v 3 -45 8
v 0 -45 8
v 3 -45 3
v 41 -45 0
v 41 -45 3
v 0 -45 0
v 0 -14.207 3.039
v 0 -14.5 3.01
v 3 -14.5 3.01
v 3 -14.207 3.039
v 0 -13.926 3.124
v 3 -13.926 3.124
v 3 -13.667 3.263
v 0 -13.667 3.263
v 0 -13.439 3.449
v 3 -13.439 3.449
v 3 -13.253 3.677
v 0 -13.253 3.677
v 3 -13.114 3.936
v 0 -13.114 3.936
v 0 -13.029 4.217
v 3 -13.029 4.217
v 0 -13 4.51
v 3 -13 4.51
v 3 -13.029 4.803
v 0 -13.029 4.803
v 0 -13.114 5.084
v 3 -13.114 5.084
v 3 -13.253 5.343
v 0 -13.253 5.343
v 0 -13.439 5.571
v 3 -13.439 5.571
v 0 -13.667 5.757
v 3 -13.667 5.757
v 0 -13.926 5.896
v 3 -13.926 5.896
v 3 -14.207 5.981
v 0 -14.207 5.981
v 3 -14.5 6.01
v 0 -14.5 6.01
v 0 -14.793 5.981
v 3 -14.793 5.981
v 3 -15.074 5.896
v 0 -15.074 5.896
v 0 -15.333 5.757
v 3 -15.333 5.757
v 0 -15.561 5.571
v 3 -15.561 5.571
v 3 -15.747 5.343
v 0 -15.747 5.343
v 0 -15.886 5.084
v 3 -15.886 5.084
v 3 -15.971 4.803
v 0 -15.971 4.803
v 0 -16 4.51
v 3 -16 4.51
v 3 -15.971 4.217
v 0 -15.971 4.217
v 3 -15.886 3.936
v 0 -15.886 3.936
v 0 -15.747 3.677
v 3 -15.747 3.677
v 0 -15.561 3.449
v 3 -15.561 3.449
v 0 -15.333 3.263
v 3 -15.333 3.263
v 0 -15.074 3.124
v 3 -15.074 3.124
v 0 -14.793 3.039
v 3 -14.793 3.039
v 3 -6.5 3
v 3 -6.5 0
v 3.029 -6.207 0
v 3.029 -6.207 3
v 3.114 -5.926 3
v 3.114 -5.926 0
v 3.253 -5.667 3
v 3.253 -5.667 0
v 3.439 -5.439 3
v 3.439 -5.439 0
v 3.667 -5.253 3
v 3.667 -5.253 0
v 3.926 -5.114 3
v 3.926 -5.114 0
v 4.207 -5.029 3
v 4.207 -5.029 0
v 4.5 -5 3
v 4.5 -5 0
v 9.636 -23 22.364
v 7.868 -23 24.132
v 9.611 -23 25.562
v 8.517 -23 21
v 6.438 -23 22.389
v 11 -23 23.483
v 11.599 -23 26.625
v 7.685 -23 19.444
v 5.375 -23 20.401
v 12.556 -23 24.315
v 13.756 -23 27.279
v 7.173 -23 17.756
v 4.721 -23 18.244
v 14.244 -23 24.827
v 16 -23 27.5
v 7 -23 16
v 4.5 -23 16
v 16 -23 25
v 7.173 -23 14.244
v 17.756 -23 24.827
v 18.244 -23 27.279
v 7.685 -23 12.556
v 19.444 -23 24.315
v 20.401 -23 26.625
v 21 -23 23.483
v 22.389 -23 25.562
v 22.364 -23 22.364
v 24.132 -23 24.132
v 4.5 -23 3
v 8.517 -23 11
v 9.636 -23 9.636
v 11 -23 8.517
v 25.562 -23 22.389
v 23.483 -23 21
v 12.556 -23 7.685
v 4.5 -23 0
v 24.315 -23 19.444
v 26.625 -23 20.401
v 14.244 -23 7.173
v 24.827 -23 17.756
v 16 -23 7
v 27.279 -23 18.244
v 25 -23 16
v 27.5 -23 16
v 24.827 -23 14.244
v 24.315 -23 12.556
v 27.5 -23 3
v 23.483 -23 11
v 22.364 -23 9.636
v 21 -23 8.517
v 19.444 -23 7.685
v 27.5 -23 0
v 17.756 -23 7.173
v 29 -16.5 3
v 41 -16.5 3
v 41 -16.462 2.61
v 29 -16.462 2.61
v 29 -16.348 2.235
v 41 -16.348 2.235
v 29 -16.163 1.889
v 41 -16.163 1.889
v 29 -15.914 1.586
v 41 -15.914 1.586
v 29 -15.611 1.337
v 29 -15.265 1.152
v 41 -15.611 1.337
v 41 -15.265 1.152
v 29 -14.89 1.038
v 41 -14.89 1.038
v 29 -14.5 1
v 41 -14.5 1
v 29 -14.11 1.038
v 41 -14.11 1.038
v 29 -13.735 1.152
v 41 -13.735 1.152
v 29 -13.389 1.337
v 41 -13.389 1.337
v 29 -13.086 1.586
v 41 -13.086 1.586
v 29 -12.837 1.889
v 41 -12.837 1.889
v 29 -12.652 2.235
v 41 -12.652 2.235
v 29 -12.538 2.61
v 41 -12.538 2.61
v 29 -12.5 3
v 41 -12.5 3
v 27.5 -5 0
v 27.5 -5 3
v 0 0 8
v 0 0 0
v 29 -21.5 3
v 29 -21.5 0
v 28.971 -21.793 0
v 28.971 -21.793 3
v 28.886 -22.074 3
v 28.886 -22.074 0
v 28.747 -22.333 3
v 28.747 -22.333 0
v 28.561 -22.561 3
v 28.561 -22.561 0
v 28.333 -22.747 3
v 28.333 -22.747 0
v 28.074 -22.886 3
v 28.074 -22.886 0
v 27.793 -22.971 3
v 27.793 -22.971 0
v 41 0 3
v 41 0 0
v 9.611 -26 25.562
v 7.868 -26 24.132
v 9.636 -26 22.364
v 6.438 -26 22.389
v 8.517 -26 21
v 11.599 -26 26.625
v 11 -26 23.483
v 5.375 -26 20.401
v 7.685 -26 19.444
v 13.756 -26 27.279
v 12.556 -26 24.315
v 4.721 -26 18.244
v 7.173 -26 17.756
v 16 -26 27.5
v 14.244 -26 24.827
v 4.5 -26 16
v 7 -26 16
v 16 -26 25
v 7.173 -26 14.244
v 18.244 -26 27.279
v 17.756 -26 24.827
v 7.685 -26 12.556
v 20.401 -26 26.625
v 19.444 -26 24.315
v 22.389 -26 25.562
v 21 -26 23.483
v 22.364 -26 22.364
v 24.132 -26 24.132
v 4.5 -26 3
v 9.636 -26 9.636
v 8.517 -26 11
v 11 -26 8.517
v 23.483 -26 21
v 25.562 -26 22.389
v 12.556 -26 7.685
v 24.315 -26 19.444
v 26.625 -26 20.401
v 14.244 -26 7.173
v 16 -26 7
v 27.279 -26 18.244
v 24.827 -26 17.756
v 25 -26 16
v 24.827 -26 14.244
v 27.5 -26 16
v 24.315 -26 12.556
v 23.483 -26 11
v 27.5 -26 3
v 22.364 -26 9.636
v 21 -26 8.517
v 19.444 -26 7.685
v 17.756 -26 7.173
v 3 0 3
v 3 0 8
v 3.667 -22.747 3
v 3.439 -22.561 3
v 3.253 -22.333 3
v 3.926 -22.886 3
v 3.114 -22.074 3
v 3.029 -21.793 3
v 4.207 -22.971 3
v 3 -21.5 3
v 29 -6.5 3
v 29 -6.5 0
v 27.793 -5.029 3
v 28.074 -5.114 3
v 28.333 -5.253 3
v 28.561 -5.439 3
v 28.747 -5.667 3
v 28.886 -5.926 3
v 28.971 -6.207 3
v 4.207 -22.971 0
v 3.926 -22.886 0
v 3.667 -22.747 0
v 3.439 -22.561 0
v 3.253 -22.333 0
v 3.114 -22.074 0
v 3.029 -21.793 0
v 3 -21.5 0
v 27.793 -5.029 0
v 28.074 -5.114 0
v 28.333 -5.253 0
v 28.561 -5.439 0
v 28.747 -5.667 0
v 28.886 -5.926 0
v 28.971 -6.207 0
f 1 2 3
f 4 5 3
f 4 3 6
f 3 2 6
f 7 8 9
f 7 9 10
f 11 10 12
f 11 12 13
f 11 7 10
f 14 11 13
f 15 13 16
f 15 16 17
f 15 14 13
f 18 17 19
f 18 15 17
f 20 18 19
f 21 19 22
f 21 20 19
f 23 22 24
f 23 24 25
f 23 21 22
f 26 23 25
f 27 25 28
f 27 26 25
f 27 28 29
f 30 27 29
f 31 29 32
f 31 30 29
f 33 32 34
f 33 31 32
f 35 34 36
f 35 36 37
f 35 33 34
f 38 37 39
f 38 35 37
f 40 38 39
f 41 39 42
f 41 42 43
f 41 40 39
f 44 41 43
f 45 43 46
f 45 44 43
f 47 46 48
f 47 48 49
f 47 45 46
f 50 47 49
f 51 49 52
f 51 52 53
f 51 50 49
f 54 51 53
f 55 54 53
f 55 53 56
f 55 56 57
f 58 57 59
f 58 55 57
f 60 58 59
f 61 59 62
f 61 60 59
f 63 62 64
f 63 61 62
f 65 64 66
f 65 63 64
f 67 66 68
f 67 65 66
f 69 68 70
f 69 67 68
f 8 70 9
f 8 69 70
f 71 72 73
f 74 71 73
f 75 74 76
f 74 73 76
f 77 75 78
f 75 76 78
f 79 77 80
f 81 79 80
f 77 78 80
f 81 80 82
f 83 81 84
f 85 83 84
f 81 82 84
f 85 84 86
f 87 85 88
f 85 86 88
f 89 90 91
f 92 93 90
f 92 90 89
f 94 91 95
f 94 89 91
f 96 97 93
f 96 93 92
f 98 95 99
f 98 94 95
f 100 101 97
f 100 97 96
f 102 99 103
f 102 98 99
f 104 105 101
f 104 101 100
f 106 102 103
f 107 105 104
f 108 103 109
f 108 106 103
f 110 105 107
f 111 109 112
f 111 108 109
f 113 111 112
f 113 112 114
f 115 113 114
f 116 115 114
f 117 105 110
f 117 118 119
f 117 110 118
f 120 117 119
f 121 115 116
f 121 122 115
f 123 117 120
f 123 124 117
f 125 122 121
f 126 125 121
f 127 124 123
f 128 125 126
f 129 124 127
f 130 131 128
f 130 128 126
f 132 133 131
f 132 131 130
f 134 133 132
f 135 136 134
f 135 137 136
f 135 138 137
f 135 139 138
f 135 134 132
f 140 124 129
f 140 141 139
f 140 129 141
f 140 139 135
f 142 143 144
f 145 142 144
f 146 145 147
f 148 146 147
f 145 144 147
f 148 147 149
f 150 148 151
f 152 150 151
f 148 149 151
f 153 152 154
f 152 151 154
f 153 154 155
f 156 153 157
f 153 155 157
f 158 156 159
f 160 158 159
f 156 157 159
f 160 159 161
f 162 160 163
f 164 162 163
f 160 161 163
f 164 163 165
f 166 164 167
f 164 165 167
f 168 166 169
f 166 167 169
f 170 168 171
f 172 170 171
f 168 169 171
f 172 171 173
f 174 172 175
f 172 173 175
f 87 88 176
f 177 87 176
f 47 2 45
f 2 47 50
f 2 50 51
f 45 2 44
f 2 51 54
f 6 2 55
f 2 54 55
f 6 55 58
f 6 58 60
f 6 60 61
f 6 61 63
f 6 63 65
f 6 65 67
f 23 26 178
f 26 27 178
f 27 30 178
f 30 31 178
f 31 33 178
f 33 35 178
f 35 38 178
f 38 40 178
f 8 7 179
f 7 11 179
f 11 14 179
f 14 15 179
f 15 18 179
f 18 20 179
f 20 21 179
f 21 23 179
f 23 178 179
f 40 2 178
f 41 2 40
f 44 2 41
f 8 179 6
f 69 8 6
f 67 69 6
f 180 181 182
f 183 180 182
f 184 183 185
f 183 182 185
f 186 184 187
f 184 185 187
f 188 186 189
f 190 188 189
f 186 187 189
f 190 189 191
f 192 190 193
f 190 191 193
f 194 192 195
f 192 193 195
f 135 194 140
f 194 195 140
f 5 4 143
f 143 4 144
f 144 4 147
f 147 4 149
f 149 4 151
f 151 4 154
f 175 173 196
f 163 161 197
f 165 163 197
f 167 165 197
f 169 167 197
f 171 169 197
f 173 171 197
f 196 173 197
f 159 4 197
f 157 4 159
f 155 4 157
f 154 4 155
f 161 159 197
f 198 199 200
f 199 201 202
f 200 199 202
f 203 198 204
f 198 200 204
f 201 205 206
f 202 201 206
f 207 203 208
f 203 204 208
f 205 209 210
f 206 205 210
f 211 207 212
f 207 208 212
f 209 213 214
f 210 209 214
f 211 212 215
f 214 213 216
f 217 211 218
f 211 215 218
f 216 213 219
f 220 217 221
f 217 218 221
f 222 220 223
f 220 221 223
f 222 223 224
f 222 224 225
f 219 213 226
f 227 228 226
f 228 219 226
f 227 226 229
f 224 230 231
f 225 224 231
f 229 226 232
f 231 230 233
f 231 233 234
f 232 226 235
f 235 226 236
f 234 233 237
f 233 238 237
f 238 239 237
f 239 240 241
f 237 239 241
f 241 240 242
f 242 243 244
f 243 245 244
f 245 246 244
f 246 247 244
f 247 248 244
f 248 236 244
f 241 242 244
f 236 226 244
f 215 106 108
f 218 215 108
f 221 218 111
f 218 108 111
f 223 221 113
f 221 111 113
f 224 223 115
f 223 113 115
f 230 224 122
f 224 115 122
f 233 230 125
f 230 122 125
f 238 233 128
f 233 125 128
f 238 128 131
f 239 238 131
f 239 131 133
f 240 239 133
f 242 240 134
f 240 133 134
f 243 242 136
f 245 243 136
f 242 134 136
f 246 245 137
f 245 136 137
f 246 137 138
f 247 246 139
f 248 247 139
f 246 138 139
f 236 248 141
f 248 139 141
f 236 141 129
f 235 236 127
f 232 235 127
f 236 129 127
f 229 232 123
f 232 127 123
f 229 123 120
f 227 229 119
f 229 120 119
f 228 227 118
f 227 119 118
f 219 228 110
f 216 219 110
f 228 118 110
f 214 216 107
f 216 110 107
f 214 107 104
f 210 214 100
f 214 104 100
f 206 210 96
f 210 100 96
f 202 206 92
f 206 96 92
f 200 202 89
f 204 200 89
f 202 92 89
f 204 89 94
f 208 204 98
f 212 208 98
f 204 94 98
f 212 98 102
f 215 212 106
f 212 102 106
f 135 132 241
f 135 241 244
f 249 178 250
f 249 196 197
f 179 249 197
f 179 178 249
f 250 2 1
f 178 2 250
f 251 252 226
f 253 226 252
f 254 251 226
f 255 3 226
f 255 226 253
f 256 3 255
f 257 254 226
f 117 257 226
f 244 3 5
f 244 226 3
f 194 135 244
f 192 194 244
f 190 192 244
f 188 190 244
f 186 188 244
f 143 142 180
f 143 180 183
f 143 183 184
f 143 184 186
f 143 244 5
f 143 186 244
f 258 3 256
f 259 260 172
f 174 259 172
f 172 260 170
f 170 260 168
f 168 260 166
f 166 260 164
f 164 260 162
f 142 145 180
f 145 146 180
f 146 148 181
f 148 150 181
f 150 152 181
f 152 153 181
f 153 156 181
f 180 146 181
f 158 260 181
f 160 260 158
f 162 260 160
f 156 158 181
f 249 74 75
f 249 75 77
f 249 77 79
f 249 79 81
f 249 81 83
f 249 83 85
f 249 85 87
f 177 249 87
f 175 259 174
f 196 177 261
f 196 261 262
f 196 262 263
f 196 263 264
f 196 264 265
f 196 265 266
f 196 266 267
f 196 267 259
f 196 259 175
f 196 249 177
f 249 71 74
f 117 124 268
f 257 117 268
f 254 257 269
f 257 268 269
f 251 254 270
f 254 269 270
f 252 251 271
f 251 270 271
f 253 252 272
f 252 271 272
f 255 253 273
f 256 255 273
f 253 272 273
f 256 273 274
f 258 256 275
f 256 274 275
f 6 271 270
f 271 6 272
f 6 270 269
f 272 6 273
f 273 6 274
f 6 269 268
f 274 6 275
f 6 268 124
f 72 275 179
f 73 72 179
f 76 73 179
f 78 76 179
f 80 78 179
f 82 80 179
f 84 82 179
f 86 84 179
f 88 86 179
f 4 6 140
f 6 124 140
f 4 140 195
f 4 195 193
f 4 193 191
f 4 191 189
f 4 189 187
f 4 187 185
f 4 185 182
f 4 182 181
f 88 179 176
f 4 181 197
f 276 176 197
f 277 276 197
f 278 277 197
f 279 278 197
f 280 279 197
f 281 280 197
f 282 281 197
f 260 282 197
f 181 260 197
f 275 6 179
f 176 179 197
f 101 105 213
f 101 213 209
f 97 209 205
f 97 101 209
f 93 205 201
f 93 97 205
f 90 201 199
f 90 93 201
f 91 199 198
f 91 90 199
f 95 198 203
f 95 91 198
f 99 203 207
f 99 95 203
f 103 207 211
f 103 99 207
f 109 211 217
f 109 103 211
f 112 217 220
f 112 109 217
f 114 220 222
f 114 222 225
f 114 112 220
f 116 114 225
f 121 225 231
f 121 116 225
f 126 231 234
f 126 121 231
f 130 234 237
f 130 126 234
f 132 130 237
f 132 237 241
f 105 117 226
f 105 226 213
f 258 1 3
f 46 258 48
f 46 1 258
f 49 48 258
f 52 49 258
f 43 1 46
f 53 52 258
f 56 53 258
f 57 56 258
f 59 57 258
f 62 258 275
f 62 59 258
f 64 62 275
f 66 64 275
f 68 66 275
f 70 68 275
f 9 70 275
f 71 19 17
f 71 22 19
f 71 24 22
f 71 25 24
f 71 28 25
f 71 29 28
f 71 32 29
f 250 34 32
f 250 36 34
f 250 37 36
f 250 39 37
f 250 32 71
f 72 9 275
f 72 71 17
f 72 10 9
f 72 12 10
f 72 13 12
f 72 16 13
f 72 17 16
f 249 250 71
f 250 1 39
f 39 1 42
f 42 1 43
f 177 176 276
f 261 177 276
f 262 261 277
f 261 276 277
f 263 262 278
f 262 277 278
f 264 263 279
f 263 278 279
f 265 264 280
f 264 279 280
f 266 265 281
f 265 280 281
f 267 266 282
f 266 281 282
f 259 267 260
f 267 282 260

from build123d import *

# Parameters (mm, degrees)
SKETCH1_W           = 41
SKETCH1_H           = 45
BOSS_EXTRUDE1_DEPTH = 3
SKETCH2_W           = 5
SKETCH2_H           = 45
SKETCH2_R           = 1.5
BOSS_EXTRUDE2_DEPTH = 3
SKETCH4_R           = 9
BOSS_EXTRUDE3_DEPTH = 3
CUT_EXTRUDE4_DEPTH  = 12


with BuildPart() as part:
    # Sketch1 → Boss-Extrude1 (new body)
    with BuildSketch(Plane.XY):
        with Locations((20.5, -22.5)):
            Rectangle(SKETCH1_W, SKETCH1_H)
        with BuildLine():
            Line((27.5, -23), (4.5, -23))
            ThreePointArc((4.5, -23), (3.439339828, -22.560660172), (3, -21.5))
            Line((3, -21.5), (3, -6.5))
            ThreePointArc((3, -6.5), (3.439339828, -5.439339828), (4.5, -5))
            Line((4.5, -5), (27.5, -5))
            ThreePointArc((27.5, -5), (28.560660172, -5.439339828), (29, -6.5))
            Line((29, -6.5), (29, -21.5))
            ThreePointArc((29, -21.5), (28.560660172, -22.560660172), (27.5, -23))
        make_face(mode=Mode.SUBTRACT)
    extrude(amount=BOSS_EXTRUDE1_DEPTH)

    # Sketch2 → Boss-Extrude2 (add)
    with BuildSketch(Plane(origin=(0, 0, 0), x_dir=(0, 0, -1), z_dir=(1, 0, 0))):
        with Locations((-5.5, -22.5)):
            Rectangle(SKETCH2_W, SKETCH2_H)
        with Locations((-4.51, -14.5)):
            Circle(SKETCH2_R, mode=Mode.SUBTRACT)
    extrude(amount=BOSS_EXTRUDE2_DEPTH)

    # Sketch4 → Boss-Extrude3 (add)
    with BuildSketch(Plane(origin=(0, -23, 0), x_dir=(1, 0, 0), z_dir=(0, 1, 0))):
        with BuildLine():
            Line((4.5, -3), (4.5, -16))
            ThreePointArc((4.5, -16), (16, -27.5), (27.5, -16))
            Line((27.5, -16), (27.5, -3))
            Line((27.5, -3), (4.5, -3))
        make_face()
        with Locations(Location((16, -16, 0), (0, 0, 270))):
            Circle(SKETCH4_R, mode=Mode.SUBTRACT)
    extrude(amount=-BOSS_EXTRUDE3_DEPTH)

    # Sketch7 → Cut-Extrude4 (cut)
    with BuildSketch(Plane(origin=(41, 0, 0), x_dir=(0, 0, -1), z_dir=(1, 0, 0))):
        with BuildLine():
            Line((-3, -12.5), (-3, -16.5))
            ThreePointArc((-3, -16.5), (-1, -14.5), (-3, -12.5))
        make_face()
    extrude(amount=-CUT_EXTRUDE4_DEPTH, mode=Mode.SUBTRACT)


solid = part.part
